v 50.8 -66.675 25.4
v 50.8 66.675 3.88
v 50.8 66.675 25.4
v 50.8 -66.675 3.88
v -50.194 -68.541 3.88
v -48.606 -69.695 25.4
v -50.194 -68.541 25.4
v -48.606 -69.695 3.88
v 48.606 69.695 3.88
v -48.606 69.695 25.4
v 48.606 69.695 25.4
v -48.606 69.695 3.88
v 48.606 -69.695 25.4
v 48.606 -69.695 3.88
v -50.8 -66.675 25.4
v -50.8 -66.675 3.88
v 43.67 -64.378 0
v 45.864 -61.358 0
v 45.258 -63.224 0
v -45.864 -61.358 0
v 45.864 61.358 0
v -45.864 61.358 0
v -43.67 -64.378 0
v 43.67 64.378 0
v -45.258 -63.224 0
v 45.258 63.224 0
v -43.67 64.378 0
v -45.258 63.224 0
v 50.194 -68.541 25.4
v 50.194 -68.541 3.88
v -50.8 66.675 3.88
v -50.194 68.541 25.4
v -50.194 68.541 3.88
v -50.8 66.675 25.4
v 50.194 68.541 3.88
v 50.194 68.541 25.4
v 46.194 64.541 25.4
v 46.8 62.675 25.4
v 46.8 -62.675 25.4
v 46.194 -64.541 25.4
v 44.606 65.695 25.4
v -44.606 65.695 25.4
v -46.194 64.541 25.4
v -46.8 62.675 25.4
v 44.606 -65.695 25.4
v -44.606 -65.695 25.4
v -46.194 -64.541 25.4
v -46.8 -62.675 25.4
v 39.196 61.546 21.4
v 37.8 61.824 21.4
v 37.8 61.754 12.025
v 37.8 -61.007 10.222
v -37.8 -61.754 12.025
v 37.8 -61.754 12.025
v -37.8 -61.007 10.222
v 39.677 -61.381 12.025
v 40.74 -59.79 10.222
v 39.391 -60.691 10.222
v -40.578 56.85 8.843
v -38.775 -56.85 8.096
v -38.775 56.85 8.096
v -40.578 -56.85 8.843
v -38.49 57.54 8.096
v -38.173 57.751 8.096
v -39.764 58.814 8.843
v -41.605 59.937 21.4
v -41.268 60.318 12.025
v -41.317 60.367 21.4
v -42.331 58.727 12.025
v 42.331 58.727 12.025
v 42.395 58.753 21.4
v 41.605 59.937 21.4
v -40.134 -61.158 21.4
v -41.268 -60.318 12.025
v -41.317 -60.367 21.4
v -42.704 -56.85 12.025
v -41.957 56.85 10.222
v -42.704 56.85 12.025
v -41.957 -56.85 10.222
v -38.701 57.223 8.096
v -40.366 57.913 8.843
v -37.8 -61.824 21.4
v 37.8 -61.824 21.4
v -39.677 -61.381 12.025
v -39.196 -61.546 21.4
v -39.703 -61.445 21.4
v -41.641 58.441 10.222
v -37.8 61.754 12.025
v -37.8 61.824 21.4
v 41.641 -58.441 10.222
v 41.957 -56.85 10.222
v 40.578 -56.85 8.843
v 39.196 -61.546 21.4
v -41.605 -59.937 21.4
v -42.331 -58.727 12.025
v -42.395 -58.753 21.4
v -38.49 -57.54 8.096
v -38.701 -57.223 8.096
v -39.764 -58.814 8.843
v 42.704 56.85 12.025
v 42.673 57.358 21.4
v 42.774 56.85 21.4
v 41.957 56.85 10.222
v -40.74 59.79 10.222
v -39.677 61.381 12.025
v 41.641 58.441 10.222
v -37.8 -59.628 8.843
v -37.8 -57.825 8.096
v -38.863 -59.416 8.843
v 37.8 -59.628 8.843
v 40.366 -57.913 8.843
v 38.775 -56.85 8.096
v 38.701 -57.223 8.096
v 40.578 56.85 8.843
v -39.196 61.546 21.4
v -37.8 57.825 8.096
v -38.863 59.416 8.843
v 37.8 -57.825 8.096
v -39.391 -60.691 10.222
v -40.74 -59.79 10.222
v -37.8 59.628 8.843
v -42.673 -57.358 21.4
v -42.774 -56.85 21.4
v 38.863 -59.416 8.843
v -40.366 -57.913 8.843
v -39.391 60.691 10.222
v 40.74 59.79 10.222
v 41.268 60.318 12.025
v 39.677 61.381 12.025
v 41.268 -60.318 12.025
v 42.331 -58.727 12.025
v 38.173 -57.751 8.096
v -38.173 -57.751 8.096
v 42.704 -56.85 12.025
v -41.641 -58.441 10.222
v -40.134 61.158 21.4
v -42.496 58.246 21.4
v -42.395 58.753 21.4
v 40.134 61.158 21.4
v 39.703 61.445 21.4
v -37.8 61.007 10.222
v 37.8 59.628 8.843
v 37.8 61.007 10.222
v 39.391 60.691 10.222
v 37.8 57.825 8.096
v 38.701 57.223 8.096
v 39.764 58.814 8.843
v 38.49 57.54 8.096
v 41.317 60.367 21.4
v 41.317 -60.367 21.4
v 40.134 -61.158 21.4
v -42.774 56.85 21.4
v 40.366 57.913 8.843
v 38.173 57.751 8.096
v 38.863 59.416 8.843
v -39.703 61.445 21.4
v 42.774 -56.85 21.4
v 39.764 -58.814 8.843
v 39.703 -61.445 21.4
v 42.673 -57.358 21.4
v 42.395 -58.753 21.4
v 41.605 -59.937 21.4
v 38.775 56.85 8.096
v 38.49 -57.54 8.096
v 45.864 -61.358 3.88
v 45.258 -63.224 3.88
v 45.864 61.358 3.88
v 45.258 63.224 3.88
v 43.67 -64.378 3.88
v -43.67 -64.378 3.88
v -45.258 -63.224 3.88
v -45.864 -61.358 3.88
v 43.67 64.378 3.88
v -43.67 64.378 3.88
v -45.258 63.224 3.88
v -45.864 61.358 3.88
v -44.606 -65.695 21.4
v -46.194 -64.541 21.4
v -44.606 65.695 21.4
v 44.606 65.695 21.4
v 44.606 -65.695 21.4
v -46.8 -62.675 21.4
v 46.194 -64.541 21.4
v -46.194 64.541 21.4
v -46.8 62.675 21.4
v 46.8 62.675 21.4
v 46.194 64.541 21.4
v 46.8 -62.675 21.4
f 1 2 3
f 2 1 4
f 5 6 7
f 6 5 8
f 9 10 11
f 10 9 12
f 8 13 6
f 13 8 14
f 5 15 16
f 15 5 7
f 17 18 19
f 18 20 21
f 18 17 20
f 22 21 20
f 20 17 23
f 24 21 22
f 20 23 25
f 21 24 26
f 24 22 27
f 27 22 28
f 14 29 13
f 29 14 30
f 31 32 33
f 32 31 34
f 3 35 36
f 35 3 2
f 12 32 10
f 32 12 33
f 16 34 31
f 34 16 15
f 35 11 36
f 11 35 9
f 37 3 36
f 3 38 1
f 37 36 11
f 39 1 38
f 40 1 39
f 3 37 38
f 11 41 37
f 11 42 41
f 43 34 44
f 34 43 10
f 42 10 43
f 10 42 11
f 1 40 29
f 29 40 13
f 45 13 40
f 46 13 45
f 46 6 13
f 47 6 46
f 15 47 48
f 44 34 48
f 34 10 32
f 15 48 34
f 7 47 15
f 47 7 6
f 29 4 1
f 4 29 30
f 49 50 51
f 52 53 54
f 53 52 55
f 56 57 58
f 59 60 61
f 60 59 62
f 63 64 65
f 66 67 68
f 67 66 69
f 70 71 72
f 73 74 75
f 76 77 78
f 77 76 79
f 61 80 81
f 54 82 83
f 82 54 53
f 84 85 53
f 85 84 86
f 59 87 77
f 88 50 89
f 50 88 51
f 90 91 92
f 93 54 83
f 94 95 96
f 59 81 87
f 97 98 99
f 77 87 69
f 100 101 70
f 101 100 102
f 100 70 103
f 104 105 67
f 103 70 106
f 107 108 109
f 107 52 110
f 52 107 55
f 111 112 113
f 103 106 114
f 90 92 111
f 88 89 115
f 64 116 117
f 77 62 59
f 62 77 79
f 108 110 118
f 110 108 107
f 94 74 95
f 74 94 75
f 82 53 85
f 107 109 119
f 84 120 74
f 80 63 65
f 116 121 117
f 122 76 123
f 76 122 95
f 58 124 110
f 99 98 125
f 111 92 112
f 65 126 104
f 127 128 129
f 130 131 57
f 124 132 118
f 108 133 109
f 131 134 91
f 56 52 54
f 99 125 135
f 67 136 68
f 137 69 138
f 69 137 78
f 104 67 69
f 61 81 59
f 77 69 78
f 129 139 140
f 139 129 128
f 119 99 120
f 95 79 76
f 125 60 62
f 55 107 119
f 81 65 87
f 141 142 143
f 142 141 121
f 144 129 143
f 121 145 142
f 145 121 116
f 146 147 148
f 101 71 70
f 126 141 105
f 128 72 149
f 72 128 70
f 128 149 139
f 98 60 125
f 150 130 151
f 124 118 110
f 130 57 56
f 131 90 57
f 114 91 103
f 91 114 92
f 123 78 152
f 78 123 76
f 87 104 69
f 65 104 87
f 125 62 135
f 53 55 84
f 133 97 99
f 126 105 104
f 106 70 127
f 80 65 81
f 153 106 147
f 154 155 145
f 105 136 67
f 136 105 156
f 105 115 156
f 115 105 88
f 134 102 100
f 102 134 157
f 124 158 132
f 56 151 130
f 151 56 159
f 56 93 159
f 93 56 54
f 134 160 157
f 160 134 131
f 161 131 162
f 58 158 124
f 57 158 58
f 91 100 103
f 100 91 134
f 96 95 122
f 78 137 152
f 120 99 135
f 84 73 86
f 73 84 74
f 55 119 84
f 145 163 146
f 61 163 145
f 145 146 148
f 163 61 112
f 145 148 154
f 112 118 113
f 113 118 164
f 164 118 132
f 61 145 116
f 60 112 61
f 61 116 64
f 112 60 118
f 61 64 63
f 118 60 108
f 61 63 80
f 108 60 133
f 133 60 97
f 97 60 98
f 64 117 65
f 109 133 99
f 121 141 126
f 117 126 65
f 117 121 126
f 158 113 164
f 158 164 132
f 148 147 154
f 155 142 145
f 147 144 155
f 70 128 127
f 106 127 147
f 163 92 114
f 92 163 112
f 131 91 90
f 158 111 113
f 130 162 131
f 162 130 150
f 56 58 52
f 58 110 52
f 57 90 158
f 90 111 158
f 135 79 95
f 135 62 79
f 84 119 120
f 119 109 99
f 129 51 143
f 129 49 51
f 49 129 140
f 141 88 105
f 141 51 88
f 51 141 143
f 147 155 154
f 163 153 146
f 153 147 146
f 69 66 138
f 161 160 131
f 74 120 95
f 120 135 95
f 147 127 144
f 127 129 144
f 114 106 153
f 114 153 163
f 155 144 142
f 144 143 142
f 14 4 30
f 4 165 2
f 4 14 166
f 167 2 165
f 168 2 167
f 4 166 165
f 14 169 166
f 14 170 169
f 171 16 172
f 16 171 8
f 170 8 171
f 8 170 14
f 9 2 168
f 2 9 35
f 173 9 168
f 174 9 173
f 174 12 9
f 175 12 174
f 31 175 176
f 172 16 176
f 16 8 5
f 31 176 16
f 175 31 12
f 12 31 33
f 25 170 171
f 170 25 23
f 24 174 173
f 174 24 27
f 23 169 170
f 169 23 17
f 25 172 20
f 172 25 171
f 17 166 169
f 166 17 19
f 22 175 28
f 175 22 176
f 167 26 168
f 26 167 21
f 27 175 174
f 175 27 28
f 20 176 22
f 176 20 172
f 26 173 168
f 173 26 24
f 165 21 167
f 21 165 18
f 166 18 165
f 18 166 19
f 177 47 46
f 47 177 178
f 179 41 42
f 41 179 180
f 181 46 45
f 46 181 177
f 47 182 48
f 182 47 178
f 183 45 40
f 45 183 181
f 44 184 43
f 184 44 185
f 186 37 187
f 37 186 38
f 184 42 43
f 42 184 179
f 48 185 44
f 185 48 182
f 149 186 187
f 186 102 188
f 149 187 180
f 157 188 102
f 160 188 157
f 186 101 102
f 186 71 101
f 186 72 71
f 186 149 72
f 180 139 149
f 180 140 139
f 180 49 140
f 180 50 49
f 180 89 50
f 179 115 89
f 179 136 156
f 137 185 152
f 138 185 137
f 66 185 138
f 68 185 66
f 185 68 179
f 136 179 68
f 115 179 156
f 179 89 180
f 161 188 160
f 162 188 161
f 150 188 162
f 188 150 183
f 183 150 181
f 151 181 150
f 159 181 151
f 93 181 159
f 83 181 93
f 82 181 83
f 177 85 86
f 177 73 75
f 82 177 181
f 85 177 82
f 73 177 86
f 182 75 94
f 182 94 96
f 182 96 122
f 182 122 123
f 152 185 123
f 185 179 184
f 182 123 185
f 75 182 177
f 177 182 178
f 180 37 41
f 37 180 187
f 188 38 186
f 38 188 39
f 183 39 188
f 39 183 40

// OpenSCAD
//hello！

/*
Use tray to specify the type of tray. 
0 - lid
1 - single tray
2 - double tray
3 - triple tray
?# - default unrounded tray prototype
*/

//Handy conversion: 1in = 25.4mm

//$fn = 60;

// TO DO: FIX DOUBLE TRAY TRANSLATION

show_box = true;
show_projection = true;
tray = 1;

wall_thickness = 8;
rounding_radius = 3.175;
tray_rounding = 5;

box_width = 4 * 25.4;
box_length = 5.5 * 25.4;
box_height = 1 * 25.4;


module build_four(x, y, z) {
    translate([0, 0, z]) {
        translate([x, y, 0]) {
            children();
        }
        translate([-x, y, 0]) {
            children();
        }
        translate([x, -y, 0]) {
            children();
        }
        translate([-x, -y, 0]) {
            children();
        }      
    }
}

module foo_cube()
{
    translate([0,-20,-55])cube([110,110,110]);
}

module rounded_rectangle(width, length, height, rounding_radius)
{
    x = width /2 - rounding_radius;
    y = length /2 - rounding_radius;
    
    hull(){
        translate([x, y, 0])cylinder(r = rounding_radius, h = height);
        translate([-x, y, 0])cylinder(r = rounding_radius, h = height);
        translate([-x, -y, 0])cylinder(r = rounding_radius, h = height);
        translate([x, -y, 0])cylinder(r = rounding_radius, h = height);
    }
}

module rounded_tray(width, length, height, tray_rounding)
{   
    x = width /2 - tray_rounding;
    y = length /2 - tray_rounding;
    
    hull(){
        build_four(x, y, tray_rounding)
        {
            sphere(r = tray_rounding);
            translate([0, 0, height - tray_rounding]) cylinder(r = tray_rounding, h = 1);
        }
        
        build_four(x, y, height)
        {
            cylinder(r = tray_rounding, h = 1);
        }
    }
}

module tray_type(width, length, height, rounding_radius, wall_thickness)
{
     if(tray == 1) single_tray(width, length, height, rounding_radius, wall_thickness);
                
    else if(tray == 2) double_tray(width, length, height, rounding_radius, wall_thickness);
                
    else if(tray == 3) triple_tray(width, length, height, rounding_radius, wall_thickness);
                
    else basic_unrounded_tray(width, length, height, rounding_radius, wall_thickness);
}

module single_tray(width, length, height, rounding_radius, wall_thickness)
{
    echo("Single tray");
    translate([0,0, wall_thickness]) rounded_tray((width - wall_thickness * 2), (length - wall_thickness*2), (height - wall_thickness)*0.97, tray_rounding);
}

module double_tray(width, length, height, rounding_radius, wall_thickness)
{
    echo("Double tray");
    
    translate([0, width / 4 + wall_thickness, wall_thickness]) rounded_tray((width - wall_thickness * 2), (length / 2 - wall_thickness*3/2), (height - wall_thickness)*0.97, tray_rounding);
            
    translate([0, - (width / 4 + wall_thickness), wall_thickness]) rounded_tray((width - wall_thickness * 2), (length / 2 - wall_thickness*3/2), (height - wall_thickness)*0.97, tray_rounding);
}

module triple_tray(width, length, height, rounding_radius, wall_thickness)
{
    echo("Triple tray");
    translate([length / 4 - wall_thickness * 3/2, width / 6 + wall_thickness / 2, wall_thickness]) rounded_tray((width / 2 - wall_thickness * 3/2), (length * 2/3 - wall_thickness*3/2), (height - wall_thickness)*0.97, tray_rounding);
            
    translate([-(length / 4 - wall_thickness * 3/2), width / 6 + wall_thickness / 2, wall_thickness]) rounded_tray((width / 2 - wall_thickness * 3/2), (length * 2/3 - wall_thickness*3/2), (height - wall_thickness)*0.97, tray_rounding);
                   
    translate([0, - (width / 3 + 4/3 * wall_thickness), wall_thickness]) rounded_tray((width - wall_thickness * 2), (length * 1/3 - wall_thickness * 3/2), (height - wall_thickness)*0.97, tray_rounding);
}

module lid(width, length, height, rounding_radius, wall_thickness)
{
    echo("lid");
        difference()
    {
        rounded_rectangle(width, length, wall_thickness*1.5, rounding_radius); 
    }
}

module basic_unrounded_tray(width, length, height, rounding_radius, wall_thickness)
{
    translate([0,0, wall_thickness]) rounded_rectangle((width -     wall_thickness * 2), (length - wall_thickness*2), (height - wall_thickness)*0.97, rounding_radius);
}

module box(width, length, height, rounding_radius, wall_thickness)
{   
    if(tray != 0)
    {
        difference()
        {
            rounded_rectangle(width, length, height, rounding_radius); 
            tray_type(width, length, height, rounding_radius, wall_thickness);
        } 
    }
    else {
        lid(width, length, height, rounding_radius, wall_thickness);
    }
}

module top_cut(width, length, height, rounding_radius, wall_thickness)
{
    translate([0,0, height - wall_thickness * 1/2])rounded_rectangle(width - wall_thickness, length - wall_thickness, wall_thickness/2, rounding_radius);
}

module bottom_cut(width, length, height, rounding_radius, wall_thickness)
{
    difference()
    {
       translate([0, 0, wall_thickness * 0.97 /4])cube([width*1.01, length*1.01, wall_thickness * 0.97 / 2], center = true);
        rounded_rectangle((width - wall_thickness) * 0.98, (length - wall_thickness) * 0.98, wall_thickness/2, rounding_radius);
    }
   
}

module cut_box(width, length, height, rounding_radius, wall_thickness)
{   
    difference(){
        box(width, length, height, rounding_radius, wall_thickness);
        if(tray != 0) top_cut(width, length, height, rounding_radius, wall_thickness);
        bottom_cut(width, length, height, rounding_radius, wall_thickness);
    }
}

module bottom_vector() {
    projection(cut = true) render_box();
}

module middle_vector() {
    projection(cut = true) translate([0,0,-box_height * 2/3]) render_box();
}


module top_vector() {
    projection(cut = true) translate([0,0,-(box_height - wall_thickness / 4)]) render_box();
}

module display_key_vectors()
{
    bottom_vector();
    translate([0,0,box_height * 2/3]) middle_vector();
    translate([0,0,box_height - wall_thickness / 4])top_vector();
}

module render_box() {
    cut_box(box_width, box_length, box_height, rounding_radius, wall_thickness);
}

module render_projection() {
    projection(cut = true) render_box();
}
    
if (show_box) render_box();
//if (show_projection) render_projection();
//display_key_vectors();
